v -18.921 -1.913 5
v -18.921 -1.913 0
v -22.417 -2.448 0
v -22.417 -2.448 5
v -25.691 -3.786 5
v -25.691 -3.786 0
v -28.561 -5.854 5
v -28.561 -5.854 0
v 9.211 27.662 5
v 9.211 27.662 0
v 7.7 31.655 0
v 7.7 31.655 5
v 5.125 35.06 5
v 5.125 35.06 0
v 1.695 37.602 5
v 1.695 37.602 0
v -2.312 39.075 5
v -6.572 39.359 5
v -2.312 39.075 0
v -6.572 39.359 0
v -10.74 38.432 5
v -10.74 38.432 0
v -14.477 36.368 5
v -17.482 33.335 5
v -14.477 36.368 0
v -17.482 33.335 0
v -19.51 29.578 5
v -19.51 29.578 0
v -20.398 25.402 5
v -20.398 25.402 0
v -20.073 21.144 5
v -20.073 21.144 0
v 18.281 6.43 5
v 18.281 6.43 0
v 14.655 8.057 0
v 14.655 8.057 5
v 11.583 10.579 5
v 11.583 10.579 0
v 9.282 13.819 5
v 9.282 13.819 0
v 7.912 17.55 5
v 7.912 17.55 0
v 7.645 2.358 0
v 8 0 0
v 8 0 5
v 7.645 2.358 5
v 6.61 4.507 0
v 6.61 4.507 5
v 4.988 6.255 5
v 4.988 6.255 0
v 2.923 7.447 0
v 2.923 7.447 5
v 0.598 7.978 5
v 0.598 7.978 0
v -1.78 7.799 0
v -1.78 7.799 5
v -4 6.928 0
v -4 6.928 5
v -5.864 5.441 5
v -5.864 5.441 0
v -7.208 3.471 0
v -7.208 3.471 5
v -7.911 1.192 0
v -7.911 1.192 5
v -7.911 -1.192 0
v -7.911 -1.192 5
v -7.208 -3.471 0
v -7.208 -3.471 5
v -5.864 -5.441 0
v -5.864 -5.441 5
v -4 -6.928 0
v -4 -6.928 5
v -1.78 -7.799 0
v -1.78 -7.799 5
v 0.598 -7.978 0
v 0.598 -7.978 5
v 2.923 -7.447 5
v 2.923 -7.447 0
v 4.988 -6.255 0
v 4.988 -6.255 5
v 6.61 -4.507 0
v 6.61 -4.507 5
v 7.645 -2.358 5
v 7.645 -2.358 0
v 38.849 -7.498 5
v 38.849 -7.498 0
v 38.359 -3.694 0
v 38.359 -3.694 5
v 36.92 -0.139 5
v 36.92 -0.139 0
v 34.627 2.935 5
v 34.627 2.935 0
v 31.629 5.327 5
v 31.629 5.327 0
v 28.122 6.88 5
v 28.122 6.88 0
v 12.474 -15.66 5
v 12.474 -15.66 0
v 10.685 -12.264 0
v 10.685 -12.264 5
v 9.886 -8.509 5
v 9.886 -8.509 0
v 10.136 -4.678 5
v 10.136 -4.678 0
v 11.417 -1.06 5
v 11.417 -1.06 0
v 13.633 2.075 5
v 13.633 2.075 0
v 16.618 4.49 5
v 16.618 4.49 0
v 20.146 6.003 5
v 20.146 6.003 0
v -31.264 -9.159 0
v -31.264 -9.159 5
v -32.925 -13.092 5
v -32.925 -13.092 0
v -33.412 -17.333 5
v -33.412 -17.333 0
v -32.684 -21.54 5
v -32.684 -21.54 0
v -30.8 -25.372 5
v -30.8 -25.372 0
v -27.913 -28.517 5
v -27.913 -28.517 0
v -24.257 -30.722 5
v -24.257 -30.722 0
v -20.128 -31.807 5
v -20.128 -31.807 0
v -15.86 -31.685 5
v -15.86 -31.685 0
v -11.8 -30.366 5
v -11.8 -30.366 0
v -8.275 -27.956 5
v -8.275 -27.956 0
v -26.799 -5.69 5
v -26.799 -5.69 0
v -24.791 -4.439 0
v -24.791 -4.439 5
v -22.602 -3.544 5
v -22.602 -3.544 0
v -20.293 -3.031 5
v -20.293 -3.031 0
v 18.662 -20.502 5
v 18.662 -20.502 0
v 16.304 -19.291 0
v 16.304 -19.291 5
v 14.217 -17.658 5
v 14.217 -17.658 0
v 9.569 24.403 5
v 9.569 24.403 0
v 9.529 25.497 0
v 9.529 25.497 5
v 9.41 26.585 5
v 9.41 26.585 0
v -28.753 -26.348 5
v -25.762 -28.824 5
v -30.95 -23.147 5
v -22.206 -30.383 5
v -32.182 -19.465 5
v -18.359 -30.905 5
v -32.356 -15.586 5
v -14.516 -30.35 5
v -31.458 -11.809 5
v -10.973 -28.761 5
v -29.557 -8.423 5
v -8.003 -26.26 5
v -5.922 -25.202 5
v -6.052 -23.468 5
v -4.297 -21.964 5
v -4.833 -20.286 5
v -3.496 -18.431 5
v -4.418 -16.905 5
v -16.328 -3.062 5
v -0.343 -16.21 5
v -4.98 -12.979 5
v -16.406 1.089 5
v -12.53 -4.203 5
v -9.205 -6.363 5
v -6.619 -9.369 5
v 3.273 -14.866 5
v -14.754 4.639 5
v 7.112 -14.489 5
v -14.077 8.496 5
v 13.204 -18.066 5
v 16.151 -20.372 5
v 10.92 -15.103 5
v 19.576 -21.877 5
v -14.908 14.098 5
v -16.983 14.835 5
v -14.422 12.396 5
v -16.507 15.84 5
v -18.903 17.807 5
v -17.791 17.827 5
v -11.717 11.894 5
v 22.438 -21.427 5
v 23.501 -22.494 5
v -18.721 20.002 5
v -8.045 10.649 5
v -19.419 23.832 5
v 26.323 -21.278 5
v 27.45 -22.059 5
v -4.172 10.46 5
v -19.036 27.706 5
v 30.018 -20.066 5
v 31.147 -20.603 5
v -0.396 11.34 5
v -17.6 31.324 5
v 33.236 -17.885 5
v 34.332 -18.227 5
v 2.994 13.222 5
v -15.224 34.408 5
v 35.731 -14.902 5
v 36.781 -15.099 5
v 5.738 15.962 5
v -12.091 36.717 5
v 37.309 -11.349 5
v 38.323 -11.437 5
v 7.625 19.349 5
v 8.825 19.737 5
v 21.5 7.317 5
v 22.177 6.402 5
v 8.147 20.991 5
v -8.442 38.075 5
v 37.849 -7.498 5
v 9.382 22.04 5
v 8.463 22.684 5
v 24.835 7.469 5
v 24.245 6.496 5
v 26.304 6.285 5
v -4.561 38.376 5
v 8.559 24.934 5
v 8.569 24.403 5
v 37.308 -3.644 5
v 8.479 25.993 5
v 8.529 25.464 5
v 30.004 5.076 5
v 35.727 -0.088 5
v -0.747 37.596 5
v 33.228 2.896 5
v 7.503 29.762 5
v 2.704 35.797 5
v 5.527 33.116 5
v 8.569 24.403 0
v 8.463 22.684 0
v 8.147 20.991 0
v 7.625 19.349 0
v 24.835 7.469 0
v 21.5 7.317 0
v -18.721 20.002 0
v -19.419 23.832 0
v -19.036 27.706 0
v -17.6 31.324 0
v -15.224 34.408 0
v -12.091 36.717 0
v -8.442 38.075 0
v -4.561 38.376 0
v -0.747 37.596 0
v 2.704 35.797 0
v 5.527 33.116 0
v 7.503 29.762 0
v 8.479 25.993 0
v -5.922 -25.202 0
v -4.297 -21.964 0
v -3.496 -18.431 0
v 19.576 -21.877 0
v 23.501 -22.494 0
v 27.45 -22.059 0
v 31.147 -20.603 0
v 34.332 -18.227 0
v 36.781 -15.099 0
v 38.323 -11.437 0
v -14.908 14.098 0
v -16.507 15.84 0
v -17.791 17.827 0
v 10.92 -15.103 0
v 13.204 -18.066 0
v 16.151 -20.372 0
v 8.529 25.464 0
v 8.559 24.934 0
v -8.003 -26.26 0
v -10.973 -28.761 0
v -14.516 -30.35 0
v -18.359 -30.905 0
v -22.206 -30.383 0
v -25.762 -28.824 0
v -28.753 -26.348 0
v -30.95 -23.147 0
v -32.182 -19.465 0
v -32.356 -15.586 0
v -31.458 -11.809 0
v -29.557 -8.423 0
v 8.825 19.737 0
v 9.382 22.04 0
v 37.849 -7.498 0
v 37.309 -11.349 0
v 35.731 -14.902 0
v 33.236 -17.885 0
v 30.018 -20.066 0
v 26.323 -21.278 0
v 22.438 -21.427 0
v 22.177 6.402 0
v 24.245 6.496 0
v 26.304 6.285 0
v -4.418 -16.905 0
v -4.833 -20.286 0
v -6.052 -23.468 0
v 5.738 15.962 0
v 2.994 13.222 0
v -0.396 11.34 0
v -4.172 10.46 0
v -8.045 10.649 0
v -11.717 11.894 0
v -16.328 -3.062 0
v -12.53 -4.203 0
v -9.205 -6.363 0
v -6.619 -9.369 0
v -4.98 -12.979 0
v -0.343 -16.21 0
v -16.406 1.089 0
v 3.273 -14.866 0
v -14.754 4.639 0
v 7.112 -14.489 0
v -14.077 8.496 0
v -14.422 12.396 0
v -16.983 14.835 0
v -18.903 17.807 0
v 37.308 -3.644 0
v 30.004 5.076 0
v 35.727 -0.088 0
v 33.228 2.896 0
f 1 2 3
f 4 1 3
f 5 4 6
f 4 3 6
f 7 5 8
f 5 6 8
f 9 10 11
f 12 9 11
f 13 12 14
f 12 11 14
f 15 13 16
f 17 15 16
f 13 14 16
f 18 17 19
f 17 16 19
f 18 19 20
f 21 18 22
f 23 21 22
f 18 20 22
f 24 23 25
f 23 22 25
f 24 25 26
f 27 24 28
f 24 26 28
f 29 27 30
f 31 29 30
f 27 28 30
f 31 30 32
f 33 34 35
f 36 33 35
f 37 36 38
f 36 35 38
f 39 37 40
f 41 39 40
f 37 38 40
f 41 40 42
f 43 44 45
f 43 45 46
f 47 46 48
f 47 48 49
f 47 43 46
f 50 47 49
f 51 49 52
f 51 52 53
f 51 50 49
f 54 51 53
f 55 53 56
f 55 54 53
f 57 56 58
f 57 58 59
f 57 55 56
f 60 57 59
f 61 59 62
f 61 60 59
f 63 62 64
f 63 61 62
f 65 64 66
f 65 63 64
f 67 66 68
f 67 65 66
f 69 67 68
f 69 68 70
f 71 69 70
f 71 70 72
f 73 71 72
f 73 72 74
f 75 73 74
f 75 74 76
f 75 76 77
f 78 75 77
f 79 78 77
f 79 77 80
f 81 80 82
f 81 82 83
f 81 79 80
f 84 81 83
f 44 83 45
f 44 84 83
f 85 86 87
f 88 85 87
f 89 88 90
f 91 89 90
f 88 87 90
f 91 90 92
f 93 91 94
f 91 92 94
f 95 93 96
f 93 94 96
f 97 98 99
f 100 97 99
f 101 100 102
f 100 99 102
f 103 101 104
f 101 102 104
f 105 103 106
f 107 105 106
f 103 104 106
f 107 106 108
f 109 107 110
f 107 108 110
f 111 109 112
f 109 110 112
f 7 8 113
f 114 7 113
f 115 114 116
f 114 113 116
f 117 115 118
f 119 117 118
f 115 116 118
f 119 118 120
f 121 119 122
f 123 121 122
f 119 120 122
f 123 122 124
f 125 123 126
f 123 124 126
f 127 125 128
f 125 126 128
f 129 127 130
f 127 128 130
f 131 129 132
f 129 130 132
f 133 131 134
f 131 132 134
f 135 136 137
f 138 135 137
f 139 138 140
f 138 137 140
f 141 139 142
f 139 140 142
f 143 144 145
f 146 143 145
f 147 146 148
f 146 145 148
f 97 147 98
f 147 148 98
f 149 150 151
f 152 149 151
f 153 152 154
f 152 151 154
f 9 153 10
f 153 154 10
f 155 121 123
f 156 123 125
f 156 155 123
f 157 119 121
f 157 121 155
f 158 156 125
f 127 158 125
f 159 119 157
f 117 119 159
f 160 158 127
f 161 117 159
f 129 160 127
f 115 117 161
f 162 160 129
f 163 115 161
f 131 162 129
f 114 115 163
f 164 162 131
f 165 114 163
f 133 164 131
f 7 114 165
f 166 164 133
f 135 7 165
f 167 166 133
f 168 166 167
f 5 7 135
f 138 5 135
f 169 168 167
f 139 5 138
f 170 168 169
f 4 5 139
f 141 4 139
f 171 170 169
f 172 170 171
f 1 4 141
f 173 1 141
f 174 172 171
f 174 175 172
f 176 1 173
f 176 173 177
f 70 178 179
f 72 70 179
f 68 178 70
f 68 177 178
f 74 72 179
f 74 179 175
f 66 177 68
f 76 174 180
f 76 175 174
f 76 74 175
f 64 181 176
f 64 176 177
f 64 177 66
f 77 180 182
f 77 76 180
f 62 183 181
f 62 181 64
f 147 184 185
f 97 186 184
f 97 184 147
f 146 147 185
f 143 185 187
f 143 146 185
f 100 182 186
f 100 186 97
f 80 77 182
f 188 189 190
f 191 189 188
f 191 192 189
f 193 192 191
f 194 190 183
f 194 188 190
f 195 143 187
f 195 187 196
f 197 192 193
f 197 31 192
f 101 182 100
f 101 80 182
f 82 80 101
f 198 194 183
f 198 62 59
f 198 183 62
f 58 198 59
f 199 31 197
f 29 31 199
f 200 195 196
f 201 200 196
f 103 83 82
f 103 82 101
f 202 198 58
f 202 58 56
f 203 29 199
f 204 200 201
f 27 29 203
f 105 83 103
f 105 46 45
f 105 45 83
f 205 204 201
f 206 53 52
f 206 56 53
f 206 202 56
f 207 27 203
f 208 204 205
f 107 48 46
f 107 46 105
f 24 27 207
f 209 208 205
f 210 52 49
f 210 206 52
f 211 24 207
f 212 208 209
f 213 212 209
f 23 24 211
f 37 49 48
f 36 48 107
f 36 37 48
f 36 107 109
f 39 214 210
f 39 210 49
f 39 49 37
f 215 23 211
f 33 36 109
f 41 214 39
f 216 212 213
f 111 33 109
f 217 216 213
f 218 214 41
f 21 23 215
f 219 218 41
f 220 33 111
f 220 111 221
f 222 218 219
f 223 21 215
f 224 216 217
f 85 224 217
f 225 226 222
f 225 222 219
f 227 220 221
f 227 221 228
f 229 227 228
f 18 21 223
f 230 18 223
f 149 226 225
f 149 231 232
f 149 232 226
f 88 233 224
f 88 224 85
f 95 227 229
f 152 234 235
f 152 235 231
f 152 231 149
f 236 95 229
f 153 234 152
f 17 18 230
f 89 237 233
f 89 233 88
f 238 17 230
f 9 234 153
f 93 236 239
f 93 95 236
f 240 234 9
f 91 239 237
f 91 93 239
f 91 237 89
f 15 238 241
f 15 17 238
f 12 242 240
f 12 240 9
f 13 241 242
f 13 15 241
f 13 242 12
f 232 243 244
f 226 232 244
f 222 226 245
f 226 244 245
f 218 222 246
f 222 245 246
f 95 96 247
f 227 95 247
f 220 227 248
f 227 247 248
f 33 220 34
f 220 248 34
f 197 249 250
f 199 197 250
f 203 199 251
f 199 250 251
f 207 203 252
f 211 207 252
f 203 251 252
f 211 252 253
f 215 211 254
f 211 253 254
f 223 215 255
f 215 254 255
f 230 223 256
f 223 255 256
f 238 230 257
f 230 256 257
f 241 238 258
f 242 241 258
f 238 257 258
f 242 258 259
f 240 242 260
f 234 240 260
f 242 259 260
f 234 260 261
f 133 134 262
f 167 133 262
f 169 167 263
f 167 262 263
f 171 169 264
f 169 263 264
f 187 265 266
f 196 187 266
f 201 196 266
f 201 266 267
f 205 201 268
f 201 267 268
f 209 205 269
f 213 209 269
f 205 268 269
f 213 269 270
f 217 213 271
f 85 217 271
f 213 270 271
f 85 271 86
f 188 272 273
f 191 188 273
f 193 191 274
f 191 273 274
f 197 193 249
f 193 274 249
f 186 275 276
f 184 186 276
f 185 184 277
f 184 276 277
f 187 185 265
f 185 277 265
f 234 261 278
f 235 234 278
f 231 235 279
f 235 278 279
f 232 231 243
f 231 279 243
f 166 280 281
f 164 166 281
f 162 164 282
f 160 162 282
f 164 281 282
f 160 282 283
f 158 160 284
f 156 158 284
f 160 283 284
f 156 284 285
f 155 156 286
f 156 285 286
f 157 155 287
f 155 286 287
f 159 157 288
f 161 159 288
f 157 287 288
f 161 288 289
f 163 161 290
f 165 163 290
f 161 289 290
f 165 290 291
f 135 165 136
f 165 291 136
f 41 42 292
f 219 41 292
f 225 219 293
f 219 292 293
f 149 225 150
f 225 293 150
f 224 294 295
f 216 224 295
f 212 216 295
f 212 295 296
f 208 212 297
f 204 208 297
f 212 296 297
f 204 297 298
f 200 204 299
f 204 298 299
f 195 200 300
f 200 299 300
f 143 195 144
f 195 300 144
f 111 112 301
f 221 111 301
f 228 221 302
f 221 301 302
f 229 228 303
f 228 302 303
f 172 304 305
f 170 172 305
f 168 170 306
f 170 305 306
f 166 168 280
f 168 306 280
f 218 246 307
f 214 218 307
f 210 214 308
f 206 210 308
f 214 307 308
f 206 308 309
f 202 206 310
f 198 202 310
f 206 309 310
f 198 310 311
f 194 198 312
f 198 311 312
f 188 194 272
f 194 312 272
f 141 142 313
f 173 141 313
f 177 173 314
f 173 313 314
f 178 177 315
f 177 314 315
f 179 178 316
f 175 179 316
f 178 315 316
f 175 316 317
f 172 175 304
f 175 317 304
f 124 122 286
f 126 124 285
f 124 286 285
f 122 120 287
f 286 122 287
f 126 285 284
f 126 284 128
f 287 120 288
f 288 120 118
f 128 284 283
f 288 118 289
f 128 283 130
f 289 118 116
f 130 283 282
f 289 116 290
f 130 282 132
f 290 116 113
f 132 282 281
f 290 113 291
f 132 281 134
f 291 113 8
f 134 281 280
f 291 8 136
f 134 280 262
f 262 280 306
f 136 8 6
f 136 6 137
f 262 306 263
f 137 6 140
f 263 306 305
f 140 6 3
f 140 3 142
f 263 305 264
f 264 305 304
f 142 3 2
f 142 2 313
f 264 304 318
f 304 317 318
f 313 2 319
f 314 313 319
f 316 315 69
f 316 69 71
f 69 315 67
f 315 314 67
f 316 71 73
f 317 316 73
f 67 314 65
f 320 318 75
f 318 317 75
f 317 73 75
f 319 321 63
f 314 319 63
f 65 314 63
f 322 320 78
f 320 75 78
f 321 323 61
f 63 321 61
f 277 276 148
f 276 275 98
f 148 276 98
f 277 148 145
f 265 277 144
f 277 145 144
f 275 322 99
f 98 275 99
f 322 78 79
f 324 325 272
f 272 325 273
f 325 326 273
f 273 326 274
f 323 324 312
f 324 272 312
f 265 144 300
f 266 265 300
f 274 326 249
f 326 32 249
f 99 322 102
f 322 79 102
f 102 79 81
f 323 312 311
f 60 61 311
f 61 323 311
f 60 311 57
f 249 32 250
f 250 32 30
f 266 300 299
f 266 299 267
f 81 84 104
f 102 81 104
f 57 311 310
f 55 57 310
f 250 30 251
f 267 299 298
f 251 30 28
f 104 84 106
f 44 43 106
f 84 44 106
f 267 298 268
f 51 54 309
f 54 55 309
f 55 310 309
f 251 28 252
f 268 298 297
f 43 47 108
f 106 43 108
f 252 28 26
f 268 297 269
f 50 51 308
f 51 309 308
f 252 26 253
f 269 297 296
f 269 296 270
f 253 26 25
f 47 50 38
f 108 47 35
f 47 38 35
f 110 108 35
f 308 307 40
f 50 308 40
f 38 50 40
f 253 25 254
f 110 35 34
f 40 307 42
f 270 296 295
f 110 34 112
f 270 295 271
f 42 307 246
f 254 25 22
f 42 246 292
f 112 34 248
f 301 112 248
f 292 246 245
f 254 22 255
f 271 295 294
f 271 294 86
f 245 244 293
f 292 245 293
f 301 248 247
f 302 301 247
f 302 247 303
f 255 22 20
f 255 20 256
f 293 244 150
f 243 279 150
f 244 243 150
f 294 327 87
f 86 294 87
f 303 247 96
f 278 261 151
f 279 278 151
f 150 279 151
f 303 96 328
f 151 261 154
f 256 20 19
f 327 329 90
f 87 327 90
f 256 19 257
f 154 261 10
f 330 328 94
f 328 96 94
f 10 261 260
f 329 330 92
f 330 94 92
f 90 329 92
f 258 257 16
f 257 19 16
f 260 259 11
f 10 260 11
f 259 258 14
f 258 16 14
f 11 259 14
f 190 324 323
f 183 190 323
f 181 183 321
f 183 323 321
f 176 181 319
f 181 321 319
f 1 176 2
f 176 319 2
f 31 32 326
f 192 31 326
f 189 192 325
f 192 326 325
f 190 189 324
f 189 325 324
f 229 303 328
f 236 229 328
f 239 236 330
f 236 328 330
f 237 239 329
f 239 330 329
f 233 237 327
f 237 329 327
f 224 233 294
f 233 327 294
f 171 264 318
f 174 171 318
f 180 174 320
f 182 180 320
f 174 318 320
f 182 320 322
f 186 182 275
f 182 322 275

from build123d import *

# Parameters (mm, degrees)
F0_R     = 8
F1_DEPTH = 5


# Not quite as in the source:
# - a feature names something its author has since deleted; it is built from what else it names


with BuildPart() as f1:
    # F0 (on Top) → F1 (new body)
    with BuildSketch(Plane.XY):
        with BuildLine():
            ThreePointArc((7.9121440123, 17.5499293192), (9.1490120469, 20.8777196251), (9.5691464087, 24.4029881218))
            ThreePointArc((9.5691464087, 24.4029881218), (9.4793257017, 26.042059033), (9.2109392818, 27.6615002765))
            ThreePointArc((9.2109392818, 27.6615002765), (8.8193827537, 26.8385345747), (8.4785274274, 25.9933087425))
            ThreePointArc((8.4785274274, 25.9933087425), (8.5464733038, 25.1994382891), (8.5691464087, 24.4029881218))
            ThreePointArc((8.5691464087, 24.4029881218), (8.3311107472, 21.8323194251), (7.6250981876, 19.3490665605))
            ThreePointArc((7.6250981876, 19.3490665605), (7.7412805882, 18.4451358603), (7.9121440123, 17.5499293192))
        make_face()
        with BuildLine():
            ThreePointArc((8.4785274274, 25.9933087425), (8.8193827537, 26.8385345747), (9.2109392818, 27.6615002765))
            ThreePointArc((9.2109392818, 27.6615002765), (-8.689365746, 39.0447809948), (-20.0726464643, 21.144475967))
            ThreePointArc((-20.0726464643, 21.144475967), (-19.3800207125, 20.593183388), (-18.7211221359, 20.0019925512))
            ThreePointArc((-18.7211221359, 20.0019925512), (-8.442463209, 38.0752303486), (8.4785274274, 25.9933087425))
        make_face()
        with BuildLine():
            ThreePointArc((18.2808163885, 6.4299700246), (11.5832094425, 10.578918544), (7.9121440123, 17.5499293192))
            ThreePointArc((7.9121440123, 17.5499293192), (-2.0581580843, 9.7870747046), (-14.4218573571, 12.3962462122))
            ThreePointArc((-14.4218573571, 12.3962462122), (-14.7542295678, 4.6387919255), (-18.9207994891, -1.9131744502))
            ThreePointArc((-18.9207994891, -1.9131744502), (-7.9907957387, -6.1219111722), (-3.4181808461, -16.9047512351))
            ThreePointArc((-3.4181808461, -16.9047512351), (-3.4376551817, -17.6688525497), (-3.4960276219, -18.4309698155))
            ThreePointArc((-3.4960276219, -18.4309698155), (3.2731601147, -14.8661881946), (10.919943616, -15.1034068738))
            ThreePointArc((10.919943616, -15.1034068738), (9.655402449, -2.646349524), (18.2808163885, 6.4299700246))
        make_face()
        Circle(F0_R, mode=Mode.SUBTRACT)
        with BuildLine():
            ThreePointArc((-14.4218573571, 12.3962462122), (-2.0581580843, 9.7870747046), (7.9121440123, 17.5499293192))
            ThreePointArc((7.9121440123, 17.5499293192), (7.7412805882, 18.4451358603), (7.6250981876, 19.3490665605))
            ThreePointArc((7.6250981876, 19.3490665605), (-2.2534030631, 10.7683334455), (-14.907533277, 14.0980115505))
            ThreePointArc((-14.907533277, 14.0980115505), (-14.6395764677, 13.2542976843), (-14.4218573571, 12.3962462122))
        make_face()
        with BuildLine():
            ThreePointArc((-18.7211221359, 20.0019925512), (-19.3800207125, 20.593183388), (-20.0726464643, 21.144475967))
            ThreePointArc((-20.0726464643, 21.144475967), (-18.0308595518, 16.2642013697), (-14.4218573571, 12.3962462122))
            ThreePointArc((-14.4218573571, 12.3962462122), (-14.6395764677, 13.2542976843), (-14.907533277, 14.0980115505))
            ThreePointArc((-14.907533277, 14.0980115505), (-17.1908591544, 16.8067871532), (-18.7211221359, 20.0019925512))
        make_face()
        with BuildLine():
            ThreePointArc((20.1455918313, 6.0030413071), (19.2063911412, 6.1867474035), (18.2808163885, 6.4299700246))
            ThreePointArc((18.2808163885, 6.4299700246), (9.655402449, -2.646349524), (10.919943616, -15.1034068738))
            ThreePointArc((10.919943616, -15.1034068738), (11.7048264649, -15.3603839917), (12.474376183, -15.6601698438))
            ThreePointArc((12.474376183, -15.6601698438), (10.6520286886, -2.8250110982), (20.1455918313, 6.0030413071))
        make_face()
        with BuildLine():
            ThreePointArc((28.1221549341, 6.8802345627), (23.1634660922, 7.4860881247), (18.2808163885, 6.4299700246))
            ThreePointArc((18.2808163885, 6.4299700246), (19.2063911412, 6.1867474035), (20.1455918313, 6.0030413071))
            ThreePointArc((20.1455918313, 6.0030413071), (23.2091706485, 6.4871331239), (26.3041545683, 6.2848101329))
            ThreePointArc((26.3041545683, 6.2848101329), (27.2226565904, 6.5535105265), (28.1221549341, 6.8802345627))
        make_face()
        with BuildLine():
            ThreePointArc((-20.2929169032, -3.0308417387), (-19.5903609061, -2.4922611868), (-18.9207994891, -1.9131744502))
            ThreePointArc((-18.9207994891, -1.9131744502), (-24.0938941246, -3.0200013713), (-28.5610315871, -5.8538427275))
            ThreePointArc((-28.5610315871, -5.8538427275), (-27.6775469435, -5.7980858959), (-26.7988899679, -5.6903090014))
            ThreePointArc((-26.7988899679, -5.6903090014), (-23.7155132394, -3.9456513623), (-20.2929169032, -3.0308417387))
        make_face()
        with BuildLine():
            ThreePointArc((-3.4181808461, -16.9047512351), (-7.9907957387, -6.1219111722), (-18.9207994891, -1.9131744502))
            ThreePointArc((-18.9207994891, -1.9131744502), (-19.5903609061, -2.4922611868), (-20.2929169032, -3.0308417387))
            ThreePointArc((-20.2929169032, -3.0308417387), (-9.2053176863, -6.3632545482), (-4.4181808461, -16.9047512351))
            ThreePointArc((-4.4181808461, -16.9047512351), (-4.4869248616, -18.2904303809), (-4.6924818025, -19.6625013626))
            ThreePointArc((-4.6924818025, -19.6625013626), (-4.1118905803, -19.0296020384), (-3.4960276219, -18.4309698155))
            ThreePointArc((-3.4960276219, -18.4309698155), (-3.4376551817, -17.6688525497), (-3.4181808461, -16.9047512351))
        make_face()
        with BuildLine():
            ThreePointArc((38.8490344373, -7.4982368866), (35.8718628785, 1.471244496), (28.1221549341, 6.8802345627))
            ThreePointArc((28.1221549341, 6.8802345627), (27.2226565904, 6.5535105265), (26.3041545683, 6.2848101329))
            ThreePointArc((26.3041545683, 6.2848101329), (34.5815011117, 1.4914326892), (37.8490344373, -7.4982368866))
            ThreePointArc((37.8490344373, -7.4982368866), (31.7032518121, -19.0875107823), (18.6617102331, -20.5017620856))
            ThreePointArc((18.6617102331, -20.5017620856), (19.1377449469, -21.1766467253), (19.5759139405, -21.876708336))
            ThreePointArc((19.5759139405, -21.876708336), (32.81851582, -19.5210653278), (38.8490344373, -7.4982368866))
        make_face()
        with BuildLine():
            ThreePointArc((12.474376183, -15.6601698438), (11.7048264649, -15.3603839917), (10.919943616, -15.1034068738))
            ThreePointArc((10.919943616, -15.1034068738), (14.6052028869, -19.311431978), (19.5759139405, -21.876708336))
            ThreePointArc((19.5759139405, -21.876708336), (19.1377449469, -21.1766467253), (18.6617102331, -20.5017620856))
            ThreePointArc((18.6617102331, -20.5017620856), (15.2214583236, -18.5238856386), (12.474376183, -15.6601698438))
        make_face()
        with BuildLine():
            ThreePointArc((-26.7988899679, -5.6903090014), (-27.6775469435, -5.7980858959), (-28.5610315871, -5.8538427275))
            ThreePointArc((-28.5610315871, -5.8538427275), (-29.4690893537, -27.0476019762), (-8.275330105, -27.9556597428))
            ThreePointArc((-8.275330105, -27.9556597428), (-8.1635176407, -27.1041048739), (-8.003150447, -26.2603453792))
            ThreePointArc((-8.003150447, -26.2603453792), (-28.7533738733, -26.348467934), (-26.7988899679, -5.6903090014))
        make_face()
        with BuildLine():
            ThreePointArc((-8.275330105, -27.9556597428), (-5.0113342557, -23.6320437442), (-3.4960276219, -18.4309698155))
            ThreePointArc((-3.4960276219, -18.4309698155), (-4.1118905803, -19.0296020384), (-4.6924818025, -19.6625013626))
            ThreePointArc((-4.6924818025, -19.6625013626), (-5.9051240284, -23.183557577), (-8.003150447, -26.2603453792))
            ThreePointArc((-8.003150447, -26.2603453792), (-8.1635176407, -27.1041048739), (-8.275330105, -27.9556597428))
        make_face()
    extrude(amount=F1_DEPTH)


solid = f1.part
